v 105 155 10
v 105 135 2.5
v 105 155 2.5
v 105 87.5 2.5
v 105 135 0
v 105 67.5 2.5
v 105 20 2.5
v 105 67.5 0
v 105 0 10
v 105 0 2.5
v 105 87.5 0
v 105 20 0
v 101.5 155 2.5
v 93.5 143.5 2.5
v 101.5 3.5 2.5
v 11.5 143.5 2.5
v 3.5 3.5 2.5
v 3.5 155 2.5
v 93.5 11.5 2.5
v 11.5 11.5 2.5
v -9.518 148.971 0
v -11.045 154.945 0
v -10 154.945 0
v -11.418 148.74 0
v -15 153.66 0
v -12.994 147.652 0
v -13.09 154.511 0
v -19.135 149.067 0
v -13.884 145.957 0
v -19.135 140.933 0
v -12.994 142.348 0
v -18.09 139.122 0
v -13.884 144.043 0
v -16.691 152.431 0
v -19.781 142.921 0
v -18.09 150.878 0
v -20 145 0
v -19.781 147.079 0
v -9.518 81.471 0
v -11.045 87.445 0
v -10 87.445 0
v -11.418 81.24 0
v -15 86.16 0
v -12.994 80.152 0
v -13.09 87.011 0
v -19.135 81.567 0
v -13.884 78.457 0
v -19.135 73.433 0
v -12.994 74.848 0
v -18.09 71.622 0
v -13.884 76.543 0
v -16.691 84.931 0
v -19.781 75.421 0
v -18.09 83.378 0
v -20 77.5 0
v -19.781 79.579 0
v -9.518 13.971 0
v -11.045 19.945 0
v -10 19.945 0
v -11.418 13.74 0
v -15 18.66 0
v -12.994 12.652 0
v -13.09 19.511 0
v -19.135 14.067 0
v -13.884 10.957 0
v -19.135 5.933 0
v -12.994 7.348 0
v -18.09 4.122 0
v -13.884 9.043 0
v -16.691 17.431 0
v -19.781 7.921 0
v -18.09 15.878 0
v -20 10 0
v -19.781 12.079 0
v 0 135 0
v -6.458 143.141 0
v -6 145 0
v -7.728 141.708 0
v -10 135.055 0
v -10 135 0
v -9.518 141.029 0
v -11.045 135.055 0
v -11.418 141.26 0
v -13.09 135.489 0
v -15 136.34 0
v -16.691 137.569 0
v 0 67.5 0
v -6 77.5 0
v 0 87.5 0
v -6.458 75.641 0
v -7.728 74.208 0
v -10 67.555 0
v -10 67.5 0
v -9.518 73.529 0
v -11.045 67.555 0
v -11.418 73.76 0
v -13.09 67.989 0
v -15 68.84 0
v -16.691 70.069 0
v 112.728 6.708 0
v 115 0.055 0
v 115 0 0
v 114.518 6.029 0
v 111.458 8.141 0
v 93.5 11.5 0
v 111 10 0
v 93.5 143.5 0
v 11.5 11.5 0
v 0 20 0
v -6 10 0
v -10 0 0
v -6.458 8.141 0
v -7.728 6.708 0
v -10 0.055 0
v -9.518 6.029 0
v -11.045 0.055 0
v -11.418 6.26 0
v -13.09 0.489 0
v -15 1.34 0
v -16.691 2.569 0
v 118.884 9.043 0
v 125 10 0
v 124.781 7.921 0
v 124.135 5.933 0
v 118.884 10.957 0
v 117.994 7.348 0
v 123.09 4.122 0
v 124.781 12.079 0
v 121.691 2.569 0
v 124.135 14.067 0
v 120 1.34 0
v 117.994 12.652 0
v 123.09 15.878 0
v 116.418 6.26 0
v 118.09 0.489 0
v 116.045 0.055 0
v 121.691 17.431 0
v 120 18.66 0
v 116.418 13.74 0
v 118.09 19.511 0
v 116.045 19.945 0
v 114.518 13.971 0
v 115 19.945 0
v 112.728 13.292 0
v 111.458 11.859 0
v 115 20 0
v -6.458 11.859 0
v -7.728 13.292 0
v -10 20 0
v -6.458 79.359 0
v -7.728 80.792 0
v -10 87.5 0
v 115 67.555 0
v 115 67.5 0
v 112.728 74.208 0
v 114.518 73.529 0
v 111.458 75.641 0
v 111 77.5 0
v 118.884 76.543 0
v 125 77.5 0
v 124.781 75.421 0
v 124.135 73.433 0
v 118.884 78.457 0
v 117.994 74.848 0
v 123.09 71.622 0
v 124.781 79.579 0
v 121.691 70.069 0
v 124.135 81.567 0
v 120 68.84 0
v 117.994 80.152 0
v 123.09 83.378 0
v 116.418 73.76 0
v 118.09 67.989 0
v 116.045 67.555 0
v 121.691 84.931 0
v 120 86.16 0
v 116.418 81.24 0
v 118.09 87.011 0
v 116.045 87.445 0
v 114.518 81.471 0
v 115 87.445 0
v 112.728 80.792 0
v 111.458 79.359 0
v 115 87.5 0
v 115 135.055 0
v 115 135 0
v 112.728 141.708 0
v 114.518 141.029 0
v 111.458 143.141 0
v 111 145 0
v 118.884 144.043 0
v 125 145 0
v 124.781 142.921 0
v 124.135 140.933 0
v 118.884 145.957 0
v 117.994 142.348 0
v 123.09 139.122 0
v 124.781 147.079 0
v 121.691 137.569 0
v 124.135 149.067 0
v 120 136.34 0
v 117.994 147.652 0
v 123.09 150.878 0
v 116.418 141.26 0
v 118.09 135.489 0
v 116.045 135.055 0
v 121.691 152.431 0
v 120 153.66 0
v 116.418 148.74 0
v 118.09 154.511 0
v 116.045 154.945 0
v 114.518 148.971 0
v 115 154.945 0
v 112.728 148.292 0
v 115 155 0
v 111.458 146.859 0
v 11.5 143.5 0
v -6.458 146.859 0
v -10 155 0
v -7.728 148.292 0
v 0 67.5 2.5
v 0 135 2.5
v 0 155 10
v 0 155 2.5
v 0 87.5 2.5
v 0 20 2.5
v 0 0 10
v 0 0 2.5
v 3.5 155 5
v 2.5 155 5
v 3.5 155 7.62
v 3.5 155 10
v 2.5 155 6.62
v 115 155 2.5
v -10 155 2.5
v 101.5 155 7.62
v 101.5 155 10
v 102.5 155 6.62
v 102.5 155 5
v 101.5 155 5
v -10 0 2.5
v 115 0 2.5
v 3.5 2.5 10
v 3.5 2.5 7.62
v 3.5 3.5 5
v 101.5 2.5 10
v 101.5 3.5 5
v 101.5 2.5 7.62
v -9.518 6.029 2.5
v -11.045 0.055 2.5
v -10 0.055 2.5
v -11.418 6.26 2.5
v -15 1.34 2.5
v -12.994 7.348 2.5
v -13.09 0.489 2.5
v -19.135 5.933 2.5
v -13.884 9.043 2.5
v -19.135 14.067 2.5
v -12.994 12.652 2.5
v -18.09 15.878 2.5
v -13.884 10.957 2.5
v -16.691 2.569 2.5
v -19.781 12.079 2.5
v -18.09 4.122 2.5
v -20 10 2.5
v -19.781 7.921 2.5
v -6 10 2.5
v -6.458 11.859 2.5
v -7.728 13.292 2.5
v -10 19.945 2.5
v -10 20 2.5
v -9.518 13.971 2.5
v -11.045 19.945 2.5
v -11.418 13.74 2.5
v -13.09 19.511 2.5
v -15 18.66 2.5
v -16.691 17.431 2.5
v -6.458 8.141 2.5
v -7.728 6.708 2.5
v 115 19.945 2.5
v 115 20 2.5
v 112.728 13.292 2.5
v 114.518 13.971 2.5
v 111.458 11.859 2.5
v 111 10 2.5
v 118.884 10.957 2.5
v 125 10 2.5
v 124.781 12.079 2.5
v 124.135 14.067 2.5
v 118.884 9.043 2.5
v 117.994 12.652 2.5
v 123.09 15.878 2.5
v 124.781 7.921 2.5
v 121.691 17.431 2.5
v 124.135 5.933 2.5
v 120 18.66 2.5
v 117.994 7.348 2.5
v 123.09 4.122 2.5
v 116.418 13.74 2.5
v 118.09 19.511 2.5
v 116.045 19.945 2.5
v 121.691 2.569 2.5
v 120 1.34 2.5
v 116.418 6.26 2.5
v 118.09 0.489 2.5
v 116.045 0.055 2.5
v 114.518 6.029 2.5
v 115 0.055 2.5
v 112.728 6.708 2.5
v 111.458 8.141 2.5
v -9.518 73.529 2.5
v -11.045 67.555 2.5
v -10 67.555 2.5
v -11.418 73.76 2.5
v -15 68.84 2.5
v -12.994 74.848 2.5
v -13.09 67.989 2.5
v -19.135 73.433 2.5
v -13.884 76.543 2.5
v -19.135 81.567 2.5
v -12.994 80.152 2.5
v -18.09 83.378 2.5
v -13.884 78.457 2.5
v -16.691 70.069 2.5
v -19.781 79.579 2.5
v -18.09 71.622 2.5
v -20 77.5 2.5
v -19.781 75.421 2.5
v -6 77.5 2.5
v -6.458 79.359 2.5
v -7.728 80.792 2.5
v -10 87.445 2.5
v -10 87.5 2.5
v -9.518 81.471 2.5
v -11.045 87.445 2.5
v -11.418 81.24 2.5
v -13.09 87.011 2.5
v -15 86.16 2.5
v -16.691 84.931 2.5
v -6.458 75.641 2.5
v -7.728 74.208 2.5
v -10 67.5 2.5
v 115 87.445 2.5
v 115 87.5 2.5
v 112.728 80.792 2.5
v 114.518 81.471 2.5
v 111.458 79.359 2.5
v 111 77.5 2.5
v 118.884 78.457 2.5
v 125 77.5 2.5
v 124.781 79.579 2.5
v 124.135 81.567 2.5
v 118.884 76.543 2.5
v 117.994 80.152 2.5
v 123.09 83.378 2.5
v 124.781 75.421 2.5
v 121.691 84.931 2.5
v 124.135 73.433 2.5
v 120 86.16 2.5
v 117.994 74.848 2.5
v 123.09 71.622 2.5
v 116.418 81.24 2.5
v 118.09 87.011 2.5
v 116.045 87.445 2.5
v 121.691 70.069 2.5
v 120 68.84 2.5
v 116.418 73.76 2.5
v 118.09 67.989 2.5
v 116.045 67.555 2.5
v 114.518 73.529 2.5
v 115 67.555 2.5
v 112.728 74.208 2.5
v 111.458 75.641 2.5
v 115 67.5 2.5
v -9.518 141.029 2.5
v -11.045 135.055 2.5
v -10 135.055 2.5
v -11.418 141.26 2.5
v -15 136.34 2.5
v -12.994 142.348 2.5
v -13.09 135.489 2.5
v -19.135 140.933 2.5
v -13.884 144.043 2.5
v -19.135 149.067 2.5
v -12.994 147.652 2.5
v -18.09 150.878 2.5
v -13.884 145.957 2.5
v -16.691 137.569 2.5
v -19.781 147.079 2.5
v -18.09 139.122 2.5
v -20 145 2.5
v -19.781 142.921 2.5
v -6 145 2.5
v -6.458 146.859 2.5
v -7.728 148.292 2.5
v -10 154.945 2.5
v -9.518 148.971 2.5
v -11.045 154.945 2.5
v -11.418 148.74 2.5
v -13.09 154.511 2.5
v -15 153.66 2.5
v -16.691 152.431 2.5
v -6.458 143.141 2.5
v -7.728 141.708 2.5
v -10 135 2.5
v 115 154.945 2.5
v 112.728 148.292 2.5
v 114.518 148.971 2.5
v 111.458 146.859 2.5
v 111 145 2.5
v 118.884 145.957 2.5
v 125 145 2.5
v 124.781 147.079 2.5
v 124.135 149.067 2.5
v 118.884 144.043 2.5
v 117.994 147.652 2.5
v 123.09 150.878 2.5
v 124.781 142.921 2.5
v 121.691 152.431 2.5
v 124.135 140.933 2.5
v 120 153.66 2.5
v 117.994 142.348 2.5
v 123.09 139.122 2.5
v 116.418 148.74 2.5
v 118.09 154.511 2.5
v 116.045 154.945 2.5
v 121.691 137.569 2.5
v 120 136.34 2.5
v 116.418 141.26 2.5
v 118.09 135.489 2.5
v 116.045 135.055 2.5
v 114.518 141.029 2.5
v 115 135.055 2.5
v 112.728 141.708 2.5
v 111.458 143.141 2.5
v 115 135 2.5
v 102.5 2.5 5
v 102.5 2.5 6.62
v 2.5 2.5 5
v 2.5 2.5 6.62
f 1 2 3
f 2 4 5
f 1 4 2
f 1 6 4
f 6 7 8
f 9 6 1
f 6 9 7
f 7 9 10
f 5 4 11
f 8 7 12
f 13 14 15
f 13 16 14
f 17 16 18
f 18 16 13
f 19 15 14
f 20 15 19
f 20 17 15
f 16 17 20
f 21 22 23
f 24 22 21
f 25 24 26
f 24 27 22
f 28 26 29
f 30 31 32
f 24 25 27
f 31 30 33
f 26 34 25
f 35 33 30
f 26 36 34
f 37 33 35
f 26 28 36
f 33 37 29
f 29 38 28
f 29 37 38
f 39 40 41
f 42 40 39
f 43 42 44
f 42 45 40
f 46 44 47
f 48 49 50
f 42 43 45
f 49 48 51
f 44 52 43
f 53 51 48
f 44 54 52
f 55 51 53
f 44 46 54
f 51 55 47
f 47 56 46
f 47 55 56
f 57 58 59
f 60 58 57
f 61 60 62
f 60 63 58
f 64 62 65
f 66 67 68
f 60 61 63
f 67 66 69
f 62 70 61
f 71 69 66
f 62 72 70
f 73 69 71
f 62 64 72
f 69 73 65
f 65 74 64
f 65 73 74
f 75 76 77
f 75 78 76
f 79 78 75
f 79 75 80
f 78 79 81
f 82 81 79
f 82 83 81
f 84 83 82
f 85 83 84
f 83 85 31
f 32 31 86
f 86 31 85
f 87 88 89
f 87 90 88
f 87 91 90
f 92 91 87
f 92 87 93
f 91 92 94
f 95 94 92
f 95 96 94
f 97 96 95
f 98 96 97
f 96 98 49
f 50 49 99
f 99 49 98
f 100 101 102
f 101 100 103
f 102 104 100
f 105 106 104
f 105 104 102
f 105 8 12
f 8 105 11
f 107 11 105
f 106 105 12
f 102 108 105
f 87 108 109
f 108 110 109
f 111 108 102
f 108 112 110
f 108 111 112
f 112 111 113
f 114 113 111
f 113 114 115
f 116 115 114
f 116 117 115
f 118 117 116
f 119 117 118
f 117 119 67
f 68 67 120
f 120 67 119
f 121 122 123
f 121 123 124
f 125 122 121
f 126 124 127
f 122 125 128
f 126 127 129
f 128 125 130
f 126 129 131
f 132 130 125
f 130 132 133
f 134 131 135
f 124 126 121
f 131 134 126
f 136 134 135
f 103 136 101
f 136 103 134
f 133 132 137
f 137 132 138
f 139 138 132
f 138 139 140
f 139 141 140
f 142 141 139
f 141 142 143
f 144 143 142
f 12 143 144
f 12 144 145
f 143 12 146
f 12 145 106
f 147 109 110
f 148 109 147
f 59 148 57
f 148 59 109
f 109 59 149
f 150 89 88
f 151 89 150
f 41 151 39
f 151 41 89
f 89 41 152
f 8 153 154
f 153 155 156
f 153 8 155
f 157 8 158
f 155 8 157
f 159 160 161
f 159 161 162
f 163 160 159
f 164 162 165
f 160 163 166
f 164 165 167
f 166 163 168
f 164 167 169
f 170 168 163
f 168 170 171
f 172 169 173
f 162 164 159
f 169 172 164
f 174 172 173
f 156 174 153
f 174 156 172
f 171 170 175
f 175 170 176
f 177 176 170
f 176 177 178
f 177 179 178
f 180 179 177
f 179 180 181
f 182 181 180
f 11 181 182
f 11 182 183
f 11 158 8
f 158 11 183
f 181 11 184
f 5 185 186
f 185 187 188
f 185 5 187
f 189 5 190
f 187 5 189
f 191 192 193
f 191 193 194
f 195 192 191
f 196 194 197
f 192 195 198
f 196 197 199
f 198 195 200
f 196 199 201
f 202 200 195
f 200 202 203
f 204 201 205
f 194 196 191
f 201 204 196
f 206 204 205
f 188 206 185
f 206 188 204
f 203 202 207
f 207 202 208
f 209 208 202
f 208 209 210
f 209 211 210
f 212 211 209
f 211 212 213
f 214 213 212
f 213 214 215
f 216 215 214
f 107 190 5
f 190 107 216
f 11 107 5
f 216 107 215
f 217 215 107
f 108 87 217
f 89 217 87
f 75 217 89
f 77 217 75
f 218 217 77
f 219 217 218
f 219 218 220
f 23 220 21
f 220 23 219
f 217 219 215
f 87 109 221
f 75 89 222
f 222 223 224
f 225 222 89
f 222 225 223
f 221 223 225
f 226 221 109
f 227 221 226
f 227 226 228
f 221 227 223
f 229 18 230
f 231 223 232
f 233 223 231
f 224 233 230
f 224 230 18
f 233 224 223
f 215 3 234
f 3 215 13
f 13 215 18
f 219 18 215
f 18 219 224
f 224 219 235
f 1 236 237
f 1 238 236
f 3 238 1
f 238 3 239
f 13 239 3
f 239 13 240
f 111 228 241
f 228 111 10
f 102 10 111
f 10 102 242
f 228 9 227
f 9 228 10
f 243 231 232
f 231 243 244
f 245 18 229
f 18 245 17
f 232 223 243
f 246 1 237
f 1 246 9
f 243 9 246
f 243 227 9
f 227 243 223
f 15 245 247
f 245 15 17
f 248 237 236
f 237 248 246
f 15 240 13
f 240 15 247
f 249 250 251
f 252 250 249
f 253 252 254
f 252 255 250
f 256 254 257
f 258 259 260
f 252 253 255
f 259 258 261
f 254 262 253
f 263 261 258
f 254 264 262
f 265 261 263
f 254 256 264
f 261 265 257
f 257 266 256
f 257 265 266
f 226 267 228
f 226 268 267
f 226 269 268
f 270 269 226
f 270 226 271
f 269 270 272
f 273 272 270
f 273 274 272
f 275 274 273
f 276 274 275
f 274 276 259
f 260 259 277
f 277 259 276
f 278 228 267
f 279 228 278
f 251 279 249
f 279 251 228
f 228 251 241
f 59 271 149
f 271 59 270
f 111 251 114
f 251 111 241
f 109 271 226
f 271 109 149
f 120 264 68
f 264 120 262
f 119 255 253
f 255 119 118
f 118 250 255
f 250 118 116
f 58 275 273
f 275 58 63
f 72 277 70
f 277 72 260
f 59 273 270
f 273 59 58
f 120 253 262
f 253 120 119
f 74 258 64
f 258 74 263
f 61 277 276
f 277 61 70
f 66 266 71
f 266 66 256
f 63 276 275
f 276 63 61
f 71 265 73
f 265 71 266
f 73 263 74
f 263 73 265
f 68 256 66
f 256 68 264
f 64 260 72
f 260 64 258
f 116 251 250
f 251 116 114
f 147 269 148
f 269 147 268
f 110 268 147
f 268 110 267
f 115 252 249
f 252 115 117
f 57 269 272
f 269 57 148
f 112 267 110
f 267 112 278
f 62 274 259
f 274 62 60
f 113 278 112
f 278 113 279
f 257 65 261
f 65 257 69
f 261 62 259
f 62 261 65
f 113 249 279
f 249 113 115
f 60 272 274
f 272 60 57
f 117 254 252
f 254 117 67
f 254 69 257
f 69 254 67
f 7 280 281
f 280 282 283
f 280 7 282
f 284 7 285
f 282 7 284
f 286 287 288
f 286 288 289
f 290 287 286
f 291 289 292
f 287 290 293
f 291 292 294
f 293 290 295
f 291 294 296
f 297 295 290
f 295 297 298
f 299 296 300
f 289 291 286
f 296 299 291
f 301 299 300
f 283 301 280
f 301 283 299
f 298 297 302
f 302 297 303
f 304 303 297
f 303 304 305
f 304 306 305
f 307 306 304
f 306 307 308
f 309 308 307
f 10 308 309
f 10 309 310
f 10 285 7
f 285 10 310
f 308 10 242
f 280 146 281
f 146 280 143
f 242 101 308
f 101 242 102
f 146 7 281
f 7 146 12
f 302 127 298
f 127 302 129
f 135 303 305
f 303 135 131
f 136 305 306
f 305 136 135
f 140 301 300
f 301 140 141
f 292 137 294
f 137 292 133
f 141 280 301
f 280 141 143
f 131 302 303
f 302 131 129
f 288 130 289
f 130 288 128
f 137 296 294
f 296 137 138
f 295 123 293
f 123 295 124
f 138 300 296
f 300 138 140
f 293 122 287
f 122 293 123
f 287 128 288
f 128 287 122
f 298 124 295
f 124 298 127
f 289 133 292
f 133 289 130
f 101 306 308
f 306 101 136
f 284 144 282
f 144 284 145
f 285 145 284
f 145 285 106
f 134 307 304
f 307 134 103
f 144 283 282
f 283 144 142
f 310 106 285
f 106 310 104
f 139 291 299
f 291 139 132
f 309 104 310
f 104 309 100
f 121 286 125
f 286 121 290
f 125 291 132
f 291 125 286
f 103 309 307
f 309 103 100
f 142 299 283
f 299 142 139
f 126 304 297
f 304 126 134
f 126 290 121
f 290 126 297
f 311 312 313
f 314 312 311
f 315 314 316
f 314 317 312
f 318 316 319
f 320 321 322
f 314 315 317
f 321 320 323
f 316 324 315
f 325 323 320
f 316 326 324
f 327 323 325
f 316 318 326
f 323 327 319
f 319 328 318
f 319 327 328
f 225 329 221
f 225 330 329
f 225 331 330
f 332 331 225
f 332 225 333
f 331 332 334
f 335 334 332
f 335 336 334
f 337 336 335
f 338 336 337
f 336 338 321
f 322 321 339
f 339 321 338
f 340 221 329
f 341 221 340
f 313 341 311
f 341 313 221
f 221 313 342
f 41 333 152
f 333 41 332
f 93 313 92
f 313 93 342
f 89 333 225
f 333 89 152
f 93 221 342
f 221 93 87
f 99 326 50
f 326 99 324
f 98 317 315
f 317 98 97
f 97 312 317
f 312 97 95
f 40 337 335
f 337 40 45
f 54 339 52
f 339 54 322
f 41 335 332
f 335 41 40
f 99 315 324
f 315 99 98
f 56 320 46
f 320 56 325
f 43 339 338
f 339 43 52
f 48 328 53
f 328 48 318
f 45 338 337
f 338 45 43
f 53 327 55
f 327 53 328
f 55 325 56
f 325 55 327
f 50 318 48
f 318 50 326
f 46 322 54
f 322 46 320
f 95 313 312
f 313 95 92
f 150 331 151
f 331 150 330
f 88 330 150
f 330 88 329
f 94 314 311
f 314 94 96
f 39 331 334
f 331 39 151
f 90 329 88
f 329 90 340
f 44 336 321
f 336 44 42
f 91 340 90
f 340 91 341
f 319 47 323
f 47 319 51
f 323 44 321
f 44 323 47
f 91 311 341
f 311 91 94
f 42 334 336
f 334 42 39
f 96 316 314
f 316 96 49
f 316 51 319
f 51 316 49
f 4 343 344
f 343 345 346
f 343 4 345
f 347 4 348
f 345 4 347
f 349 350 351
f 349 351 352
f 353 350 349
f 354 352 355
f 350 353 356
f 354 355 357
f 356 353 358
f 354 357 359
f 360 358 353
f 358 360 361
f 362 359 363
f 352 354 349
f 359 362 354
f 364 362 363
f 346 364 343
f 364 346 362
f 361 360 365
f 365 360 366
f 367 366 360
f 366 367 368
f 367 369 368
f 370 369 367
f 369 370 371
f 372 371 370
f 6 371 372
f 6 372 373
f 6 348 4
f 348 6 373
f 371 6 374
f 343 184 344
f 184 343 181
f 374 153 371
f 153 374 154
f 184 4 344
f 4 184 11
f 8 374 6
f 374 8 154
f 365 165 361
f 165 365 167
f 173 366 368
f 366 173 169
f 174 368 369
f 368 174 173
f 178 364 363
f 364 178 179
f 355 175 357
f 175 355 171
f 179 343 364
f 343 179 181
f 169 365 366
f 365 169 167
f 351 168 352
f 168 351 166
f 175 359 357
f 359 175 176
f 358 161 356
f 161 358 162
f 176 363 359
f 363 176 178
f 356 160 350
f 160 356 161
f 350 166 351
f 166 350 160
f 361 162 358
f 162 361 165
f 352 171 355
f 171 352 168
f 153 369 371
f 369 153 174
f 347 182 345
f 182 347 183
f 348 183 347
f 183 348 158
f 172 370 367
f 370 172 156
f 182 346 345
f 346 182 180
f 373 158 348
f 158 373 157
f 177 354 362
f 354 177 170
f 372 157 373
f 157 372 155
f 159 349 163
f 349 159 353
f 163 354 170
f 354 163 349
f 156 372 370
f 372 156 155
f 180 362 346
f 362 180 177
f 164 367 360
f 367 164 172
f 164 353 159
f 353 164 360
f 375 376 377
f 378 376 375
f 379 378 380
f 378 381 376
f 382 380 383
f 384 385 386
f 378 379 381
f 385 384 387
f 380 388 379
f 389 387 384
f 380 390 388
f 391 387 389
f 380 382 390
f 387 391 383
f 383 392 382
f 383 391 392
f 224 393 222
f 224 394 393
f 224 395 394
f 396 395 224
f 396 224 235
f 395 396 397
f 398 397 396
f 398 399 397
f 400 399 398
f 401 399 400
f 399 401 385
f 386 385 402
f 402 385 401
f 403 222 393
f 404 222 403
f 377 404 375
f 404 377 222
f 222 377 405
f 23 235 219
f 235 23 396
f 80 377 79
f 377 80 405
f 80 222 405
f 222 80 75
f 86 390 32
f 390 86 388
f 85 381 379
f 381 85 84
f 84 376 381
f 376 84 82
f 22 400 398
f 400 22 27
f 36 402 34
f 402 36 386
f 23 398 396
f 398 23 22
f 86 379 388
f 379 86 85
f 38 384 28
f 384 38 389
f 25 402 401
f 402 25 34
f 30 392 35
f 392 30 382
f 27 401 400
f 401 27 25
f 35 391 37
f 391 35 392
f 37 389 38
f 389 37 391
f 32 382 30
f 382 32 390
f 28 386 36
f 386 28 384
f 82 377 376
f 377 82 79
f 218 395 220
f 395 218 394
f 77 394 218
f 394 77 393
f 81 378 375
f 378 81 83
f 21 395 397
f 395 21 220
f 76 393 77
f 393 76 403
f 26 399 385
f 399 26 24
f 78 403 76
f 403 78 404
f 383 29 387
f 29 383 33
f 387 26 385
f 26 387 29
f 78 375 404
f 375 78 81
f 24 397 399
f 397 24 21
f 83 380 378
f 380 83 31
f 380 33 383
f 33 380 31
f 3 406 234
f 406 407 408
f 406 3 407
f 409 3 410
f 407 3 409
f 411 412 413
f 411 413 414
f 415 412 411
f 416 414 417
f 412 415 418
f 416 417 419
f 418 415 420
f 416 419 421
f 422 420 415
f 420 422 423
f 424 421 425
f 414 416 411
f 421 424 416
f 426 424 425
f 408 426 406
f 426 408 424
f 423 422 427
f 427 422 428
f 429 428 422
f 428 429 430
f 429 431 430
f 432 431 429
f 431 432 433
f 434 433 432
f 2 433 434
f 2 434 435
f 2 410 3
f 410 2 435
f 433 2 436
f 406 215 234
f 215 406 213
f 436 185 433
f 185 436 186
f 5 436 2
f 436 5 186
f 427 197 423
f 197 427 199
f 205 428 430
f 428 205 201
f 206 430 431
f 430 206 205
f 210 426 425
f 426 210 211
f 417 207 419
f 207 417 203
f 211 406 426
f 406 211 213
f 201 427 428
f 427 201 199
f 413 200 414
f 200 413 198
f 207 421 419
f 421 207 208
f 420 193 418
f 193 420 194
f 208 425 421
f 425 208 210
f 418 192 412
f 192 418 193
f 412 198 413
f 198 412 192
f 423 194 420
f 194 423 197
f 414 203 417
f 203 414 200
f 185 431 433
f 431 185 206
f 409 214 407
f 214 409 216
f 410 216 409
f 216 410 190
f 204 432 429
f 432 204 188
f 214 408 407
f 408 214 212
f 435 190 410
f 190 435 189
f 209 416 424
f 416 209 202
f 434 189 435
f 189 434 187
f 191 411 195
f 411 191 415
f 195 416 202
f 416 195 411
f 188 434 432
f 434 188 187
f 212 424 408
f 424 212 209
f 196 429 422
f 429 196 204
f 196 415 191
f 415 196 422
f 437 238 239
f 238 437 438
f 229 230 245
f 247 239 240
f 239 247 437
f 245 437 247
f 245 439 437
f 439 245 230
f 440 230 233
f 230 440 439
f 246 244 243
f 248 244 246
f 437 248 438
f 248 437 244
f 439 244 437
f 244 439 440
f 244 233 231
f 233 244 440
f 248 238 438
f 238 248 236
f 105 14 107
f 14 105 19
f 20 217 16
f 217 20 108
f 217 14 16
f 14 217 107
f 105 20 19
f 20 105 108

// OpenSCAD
/* pcb_box_slide_with_tabs.scad
 * By Nicholas C Lewis - Jan 1, 2011
 * http://www.thingiverse.com/thing:5396 
 *
 * derived from pcb_box_slide.scad 
 *     Parametric, open PCB-box (slide-in) by chlunde
 *     http://www.thingiverse.com/thing:4071
 *
 * CHANGES
 * - adjusted to fit Arduino Mega
 * - added mounting tabs
 * - turned off cutouts
 * - adjusted bottom cutout size
 */

//CUSTOMIZER VARIABLES
// PCB width
pcb_width_text_box = 100;
// PCB length
pcb_length_text_box = 150;
// PCB height
pcb_height_text_box = 1.62;
// PCB bottom margin
pcb_bottom_margin_text_box = 2.5;
// Wall width tick
wall_width_thick_text_box = 3.5;
// Tab hole radius
tab_hole_radius_text_box = 4;
// Tab outer radius
tab_outer_radius_text_box = 7;
// Box height
box_height_text_box = 10;
//CUSTOMIZER VARIABLES END

pcb_width = pcb_width_text_box;
pcb_length = pcb_length_text_box;
pcb_height = pcb_height_text_box;
slisse = 1;

pcb_bottom_margin = pcb_bottom_margin_text_box;
wall_width_thick = wall_width_thick_text_box;
wall_width = wall_width_thick-slisse;
box_height = box_height_text_box;

//tab parameters
tab_hole_radius=tab_hole_radius_text_box;
tab_outer_radius=box_height_text_box;



module tab() {
	difference(){
		union() {
			translate([-tab_outer_radius,-tab_outer_radius,0])
			cube([tab_outer_radius,2*tab_outer_radius,wall_width]);
			translate([-tab_outer_radius,0,0])
				cylinder(r=tab_outer_radius, h = wall_width);
		}
		translate([-tab_outer_radius,0,0])
		cylinder(r= tab_hole_radius, h = wall_width+3,center=true);
	}

}

module box() {
  union() {
    cube([pcb_width + 2*wall_width, pcb_length + 2*wall_width, wall_width]);

    cube([wall_width_thick, pcb_length + 2*wall_width, box_height]);

    cube([pcb_width + 2*wall_width, wall_width_thick, box_height]);

    %translate([0, pcb_length+wall_width, 0])
      cube([pcb_width + 2*wall_width,wall_width,box_height]);

    translate([pcb_width + wall_width - slisse,0,0])
      cube([wall_width_thick, pcb_length + 2*wall_width, box_height]);
  }
//comment out this part to remove tabs
 for(i=[tab_outer_radius,(pcb_length + 2*wall_width)/2,pcb_length + 2*wall_width-tab_outer_radius]){
	translate([0,i,0])tab();
	translate([pcb_width + 2*wall_width,i,0])mirror()tab();
 }


}

module pcb() {
  translate([wall_width, wall_width, wall_width + pcb_bottom_margin])
    cube([pcb_width,pcb_length + wall_width + 0.1,pcb_height]);
  translate([wall_width, wall_width, wall_width + pcb_bottom_margin+pcb_height])rotate([0,45,0])
    cube([pcb_height,pcb_length + wall_width + 0.1,pcb_height]);
  translate([wall_width+pcb_width-2*cos(45)*pcb_height, wall_width, wall_width + pcb_bottom_margin+pcb_height])rotate([0,45,0])
    cube([pcb_height,pcb_length + wall_width + 0.1,pcb_height]);
  translate([wall_width_thick, wall_width, wall_width + pcb_bottom_margin])
    cube([pcb_width-2*slisse,pcb_length + wall_width + 0.1,box_height]);

}



module holes() {
  *translate([wall_width + pcb_width/2, wall_width_thick + 0.1, pcb_width/2+wall_width])
    rotate(a=90,v=[1,0,0])
      cylinder(r=pcb_width/2, h=wall_width_thick + 0.2);

  *translate([-0.1, wall_width + pcb_length/2, pcb_length/2 + wall_width])
    rotate(a=90,v=[0,1,0])
      cylinder(r=pcb_length/2, h=wall_width_thick + 0.2);

  *translate([pcb_width + wall_width - slisse - 0.1, wall_width + pcb_length/2, pcb_length/2 + wall_width])
    rotate(a=90,v=[0,1,0])
      cylinder(r=pcb_length/2, h=wall_width_thick + 0.2);

 * translate([pcb_width/2 + wall_width, wall_width + pcb_length/2, -0.1])
    rotate(a=0,v=[0,1,0])
      cylinder(r=min(pcb_length,pcb_width)/2 - wall_width/2, h=wall_width_thick + 0.2);
   
  inner_margin = 9;
  translate([inner_margin +wall_width, inner_margin+wall_width, -0.1])
    cube([pcb_width-inner_margin*2,pcb_length -inner_margin*2,wall_width + 0.2]);
}

difference() {
  box();
  pcb();
  holes();
}

* color([1,0,0])
  translate([pcb_width/2 + wall_width, wall_width + pcb_length/2, -0.1])
    rotate(a=0,v=[0,1,0])
      cylinder(r=min(pcb_length,pcb_width)/2 - wall_width/2, h=wall_width_thick + 0.2);

